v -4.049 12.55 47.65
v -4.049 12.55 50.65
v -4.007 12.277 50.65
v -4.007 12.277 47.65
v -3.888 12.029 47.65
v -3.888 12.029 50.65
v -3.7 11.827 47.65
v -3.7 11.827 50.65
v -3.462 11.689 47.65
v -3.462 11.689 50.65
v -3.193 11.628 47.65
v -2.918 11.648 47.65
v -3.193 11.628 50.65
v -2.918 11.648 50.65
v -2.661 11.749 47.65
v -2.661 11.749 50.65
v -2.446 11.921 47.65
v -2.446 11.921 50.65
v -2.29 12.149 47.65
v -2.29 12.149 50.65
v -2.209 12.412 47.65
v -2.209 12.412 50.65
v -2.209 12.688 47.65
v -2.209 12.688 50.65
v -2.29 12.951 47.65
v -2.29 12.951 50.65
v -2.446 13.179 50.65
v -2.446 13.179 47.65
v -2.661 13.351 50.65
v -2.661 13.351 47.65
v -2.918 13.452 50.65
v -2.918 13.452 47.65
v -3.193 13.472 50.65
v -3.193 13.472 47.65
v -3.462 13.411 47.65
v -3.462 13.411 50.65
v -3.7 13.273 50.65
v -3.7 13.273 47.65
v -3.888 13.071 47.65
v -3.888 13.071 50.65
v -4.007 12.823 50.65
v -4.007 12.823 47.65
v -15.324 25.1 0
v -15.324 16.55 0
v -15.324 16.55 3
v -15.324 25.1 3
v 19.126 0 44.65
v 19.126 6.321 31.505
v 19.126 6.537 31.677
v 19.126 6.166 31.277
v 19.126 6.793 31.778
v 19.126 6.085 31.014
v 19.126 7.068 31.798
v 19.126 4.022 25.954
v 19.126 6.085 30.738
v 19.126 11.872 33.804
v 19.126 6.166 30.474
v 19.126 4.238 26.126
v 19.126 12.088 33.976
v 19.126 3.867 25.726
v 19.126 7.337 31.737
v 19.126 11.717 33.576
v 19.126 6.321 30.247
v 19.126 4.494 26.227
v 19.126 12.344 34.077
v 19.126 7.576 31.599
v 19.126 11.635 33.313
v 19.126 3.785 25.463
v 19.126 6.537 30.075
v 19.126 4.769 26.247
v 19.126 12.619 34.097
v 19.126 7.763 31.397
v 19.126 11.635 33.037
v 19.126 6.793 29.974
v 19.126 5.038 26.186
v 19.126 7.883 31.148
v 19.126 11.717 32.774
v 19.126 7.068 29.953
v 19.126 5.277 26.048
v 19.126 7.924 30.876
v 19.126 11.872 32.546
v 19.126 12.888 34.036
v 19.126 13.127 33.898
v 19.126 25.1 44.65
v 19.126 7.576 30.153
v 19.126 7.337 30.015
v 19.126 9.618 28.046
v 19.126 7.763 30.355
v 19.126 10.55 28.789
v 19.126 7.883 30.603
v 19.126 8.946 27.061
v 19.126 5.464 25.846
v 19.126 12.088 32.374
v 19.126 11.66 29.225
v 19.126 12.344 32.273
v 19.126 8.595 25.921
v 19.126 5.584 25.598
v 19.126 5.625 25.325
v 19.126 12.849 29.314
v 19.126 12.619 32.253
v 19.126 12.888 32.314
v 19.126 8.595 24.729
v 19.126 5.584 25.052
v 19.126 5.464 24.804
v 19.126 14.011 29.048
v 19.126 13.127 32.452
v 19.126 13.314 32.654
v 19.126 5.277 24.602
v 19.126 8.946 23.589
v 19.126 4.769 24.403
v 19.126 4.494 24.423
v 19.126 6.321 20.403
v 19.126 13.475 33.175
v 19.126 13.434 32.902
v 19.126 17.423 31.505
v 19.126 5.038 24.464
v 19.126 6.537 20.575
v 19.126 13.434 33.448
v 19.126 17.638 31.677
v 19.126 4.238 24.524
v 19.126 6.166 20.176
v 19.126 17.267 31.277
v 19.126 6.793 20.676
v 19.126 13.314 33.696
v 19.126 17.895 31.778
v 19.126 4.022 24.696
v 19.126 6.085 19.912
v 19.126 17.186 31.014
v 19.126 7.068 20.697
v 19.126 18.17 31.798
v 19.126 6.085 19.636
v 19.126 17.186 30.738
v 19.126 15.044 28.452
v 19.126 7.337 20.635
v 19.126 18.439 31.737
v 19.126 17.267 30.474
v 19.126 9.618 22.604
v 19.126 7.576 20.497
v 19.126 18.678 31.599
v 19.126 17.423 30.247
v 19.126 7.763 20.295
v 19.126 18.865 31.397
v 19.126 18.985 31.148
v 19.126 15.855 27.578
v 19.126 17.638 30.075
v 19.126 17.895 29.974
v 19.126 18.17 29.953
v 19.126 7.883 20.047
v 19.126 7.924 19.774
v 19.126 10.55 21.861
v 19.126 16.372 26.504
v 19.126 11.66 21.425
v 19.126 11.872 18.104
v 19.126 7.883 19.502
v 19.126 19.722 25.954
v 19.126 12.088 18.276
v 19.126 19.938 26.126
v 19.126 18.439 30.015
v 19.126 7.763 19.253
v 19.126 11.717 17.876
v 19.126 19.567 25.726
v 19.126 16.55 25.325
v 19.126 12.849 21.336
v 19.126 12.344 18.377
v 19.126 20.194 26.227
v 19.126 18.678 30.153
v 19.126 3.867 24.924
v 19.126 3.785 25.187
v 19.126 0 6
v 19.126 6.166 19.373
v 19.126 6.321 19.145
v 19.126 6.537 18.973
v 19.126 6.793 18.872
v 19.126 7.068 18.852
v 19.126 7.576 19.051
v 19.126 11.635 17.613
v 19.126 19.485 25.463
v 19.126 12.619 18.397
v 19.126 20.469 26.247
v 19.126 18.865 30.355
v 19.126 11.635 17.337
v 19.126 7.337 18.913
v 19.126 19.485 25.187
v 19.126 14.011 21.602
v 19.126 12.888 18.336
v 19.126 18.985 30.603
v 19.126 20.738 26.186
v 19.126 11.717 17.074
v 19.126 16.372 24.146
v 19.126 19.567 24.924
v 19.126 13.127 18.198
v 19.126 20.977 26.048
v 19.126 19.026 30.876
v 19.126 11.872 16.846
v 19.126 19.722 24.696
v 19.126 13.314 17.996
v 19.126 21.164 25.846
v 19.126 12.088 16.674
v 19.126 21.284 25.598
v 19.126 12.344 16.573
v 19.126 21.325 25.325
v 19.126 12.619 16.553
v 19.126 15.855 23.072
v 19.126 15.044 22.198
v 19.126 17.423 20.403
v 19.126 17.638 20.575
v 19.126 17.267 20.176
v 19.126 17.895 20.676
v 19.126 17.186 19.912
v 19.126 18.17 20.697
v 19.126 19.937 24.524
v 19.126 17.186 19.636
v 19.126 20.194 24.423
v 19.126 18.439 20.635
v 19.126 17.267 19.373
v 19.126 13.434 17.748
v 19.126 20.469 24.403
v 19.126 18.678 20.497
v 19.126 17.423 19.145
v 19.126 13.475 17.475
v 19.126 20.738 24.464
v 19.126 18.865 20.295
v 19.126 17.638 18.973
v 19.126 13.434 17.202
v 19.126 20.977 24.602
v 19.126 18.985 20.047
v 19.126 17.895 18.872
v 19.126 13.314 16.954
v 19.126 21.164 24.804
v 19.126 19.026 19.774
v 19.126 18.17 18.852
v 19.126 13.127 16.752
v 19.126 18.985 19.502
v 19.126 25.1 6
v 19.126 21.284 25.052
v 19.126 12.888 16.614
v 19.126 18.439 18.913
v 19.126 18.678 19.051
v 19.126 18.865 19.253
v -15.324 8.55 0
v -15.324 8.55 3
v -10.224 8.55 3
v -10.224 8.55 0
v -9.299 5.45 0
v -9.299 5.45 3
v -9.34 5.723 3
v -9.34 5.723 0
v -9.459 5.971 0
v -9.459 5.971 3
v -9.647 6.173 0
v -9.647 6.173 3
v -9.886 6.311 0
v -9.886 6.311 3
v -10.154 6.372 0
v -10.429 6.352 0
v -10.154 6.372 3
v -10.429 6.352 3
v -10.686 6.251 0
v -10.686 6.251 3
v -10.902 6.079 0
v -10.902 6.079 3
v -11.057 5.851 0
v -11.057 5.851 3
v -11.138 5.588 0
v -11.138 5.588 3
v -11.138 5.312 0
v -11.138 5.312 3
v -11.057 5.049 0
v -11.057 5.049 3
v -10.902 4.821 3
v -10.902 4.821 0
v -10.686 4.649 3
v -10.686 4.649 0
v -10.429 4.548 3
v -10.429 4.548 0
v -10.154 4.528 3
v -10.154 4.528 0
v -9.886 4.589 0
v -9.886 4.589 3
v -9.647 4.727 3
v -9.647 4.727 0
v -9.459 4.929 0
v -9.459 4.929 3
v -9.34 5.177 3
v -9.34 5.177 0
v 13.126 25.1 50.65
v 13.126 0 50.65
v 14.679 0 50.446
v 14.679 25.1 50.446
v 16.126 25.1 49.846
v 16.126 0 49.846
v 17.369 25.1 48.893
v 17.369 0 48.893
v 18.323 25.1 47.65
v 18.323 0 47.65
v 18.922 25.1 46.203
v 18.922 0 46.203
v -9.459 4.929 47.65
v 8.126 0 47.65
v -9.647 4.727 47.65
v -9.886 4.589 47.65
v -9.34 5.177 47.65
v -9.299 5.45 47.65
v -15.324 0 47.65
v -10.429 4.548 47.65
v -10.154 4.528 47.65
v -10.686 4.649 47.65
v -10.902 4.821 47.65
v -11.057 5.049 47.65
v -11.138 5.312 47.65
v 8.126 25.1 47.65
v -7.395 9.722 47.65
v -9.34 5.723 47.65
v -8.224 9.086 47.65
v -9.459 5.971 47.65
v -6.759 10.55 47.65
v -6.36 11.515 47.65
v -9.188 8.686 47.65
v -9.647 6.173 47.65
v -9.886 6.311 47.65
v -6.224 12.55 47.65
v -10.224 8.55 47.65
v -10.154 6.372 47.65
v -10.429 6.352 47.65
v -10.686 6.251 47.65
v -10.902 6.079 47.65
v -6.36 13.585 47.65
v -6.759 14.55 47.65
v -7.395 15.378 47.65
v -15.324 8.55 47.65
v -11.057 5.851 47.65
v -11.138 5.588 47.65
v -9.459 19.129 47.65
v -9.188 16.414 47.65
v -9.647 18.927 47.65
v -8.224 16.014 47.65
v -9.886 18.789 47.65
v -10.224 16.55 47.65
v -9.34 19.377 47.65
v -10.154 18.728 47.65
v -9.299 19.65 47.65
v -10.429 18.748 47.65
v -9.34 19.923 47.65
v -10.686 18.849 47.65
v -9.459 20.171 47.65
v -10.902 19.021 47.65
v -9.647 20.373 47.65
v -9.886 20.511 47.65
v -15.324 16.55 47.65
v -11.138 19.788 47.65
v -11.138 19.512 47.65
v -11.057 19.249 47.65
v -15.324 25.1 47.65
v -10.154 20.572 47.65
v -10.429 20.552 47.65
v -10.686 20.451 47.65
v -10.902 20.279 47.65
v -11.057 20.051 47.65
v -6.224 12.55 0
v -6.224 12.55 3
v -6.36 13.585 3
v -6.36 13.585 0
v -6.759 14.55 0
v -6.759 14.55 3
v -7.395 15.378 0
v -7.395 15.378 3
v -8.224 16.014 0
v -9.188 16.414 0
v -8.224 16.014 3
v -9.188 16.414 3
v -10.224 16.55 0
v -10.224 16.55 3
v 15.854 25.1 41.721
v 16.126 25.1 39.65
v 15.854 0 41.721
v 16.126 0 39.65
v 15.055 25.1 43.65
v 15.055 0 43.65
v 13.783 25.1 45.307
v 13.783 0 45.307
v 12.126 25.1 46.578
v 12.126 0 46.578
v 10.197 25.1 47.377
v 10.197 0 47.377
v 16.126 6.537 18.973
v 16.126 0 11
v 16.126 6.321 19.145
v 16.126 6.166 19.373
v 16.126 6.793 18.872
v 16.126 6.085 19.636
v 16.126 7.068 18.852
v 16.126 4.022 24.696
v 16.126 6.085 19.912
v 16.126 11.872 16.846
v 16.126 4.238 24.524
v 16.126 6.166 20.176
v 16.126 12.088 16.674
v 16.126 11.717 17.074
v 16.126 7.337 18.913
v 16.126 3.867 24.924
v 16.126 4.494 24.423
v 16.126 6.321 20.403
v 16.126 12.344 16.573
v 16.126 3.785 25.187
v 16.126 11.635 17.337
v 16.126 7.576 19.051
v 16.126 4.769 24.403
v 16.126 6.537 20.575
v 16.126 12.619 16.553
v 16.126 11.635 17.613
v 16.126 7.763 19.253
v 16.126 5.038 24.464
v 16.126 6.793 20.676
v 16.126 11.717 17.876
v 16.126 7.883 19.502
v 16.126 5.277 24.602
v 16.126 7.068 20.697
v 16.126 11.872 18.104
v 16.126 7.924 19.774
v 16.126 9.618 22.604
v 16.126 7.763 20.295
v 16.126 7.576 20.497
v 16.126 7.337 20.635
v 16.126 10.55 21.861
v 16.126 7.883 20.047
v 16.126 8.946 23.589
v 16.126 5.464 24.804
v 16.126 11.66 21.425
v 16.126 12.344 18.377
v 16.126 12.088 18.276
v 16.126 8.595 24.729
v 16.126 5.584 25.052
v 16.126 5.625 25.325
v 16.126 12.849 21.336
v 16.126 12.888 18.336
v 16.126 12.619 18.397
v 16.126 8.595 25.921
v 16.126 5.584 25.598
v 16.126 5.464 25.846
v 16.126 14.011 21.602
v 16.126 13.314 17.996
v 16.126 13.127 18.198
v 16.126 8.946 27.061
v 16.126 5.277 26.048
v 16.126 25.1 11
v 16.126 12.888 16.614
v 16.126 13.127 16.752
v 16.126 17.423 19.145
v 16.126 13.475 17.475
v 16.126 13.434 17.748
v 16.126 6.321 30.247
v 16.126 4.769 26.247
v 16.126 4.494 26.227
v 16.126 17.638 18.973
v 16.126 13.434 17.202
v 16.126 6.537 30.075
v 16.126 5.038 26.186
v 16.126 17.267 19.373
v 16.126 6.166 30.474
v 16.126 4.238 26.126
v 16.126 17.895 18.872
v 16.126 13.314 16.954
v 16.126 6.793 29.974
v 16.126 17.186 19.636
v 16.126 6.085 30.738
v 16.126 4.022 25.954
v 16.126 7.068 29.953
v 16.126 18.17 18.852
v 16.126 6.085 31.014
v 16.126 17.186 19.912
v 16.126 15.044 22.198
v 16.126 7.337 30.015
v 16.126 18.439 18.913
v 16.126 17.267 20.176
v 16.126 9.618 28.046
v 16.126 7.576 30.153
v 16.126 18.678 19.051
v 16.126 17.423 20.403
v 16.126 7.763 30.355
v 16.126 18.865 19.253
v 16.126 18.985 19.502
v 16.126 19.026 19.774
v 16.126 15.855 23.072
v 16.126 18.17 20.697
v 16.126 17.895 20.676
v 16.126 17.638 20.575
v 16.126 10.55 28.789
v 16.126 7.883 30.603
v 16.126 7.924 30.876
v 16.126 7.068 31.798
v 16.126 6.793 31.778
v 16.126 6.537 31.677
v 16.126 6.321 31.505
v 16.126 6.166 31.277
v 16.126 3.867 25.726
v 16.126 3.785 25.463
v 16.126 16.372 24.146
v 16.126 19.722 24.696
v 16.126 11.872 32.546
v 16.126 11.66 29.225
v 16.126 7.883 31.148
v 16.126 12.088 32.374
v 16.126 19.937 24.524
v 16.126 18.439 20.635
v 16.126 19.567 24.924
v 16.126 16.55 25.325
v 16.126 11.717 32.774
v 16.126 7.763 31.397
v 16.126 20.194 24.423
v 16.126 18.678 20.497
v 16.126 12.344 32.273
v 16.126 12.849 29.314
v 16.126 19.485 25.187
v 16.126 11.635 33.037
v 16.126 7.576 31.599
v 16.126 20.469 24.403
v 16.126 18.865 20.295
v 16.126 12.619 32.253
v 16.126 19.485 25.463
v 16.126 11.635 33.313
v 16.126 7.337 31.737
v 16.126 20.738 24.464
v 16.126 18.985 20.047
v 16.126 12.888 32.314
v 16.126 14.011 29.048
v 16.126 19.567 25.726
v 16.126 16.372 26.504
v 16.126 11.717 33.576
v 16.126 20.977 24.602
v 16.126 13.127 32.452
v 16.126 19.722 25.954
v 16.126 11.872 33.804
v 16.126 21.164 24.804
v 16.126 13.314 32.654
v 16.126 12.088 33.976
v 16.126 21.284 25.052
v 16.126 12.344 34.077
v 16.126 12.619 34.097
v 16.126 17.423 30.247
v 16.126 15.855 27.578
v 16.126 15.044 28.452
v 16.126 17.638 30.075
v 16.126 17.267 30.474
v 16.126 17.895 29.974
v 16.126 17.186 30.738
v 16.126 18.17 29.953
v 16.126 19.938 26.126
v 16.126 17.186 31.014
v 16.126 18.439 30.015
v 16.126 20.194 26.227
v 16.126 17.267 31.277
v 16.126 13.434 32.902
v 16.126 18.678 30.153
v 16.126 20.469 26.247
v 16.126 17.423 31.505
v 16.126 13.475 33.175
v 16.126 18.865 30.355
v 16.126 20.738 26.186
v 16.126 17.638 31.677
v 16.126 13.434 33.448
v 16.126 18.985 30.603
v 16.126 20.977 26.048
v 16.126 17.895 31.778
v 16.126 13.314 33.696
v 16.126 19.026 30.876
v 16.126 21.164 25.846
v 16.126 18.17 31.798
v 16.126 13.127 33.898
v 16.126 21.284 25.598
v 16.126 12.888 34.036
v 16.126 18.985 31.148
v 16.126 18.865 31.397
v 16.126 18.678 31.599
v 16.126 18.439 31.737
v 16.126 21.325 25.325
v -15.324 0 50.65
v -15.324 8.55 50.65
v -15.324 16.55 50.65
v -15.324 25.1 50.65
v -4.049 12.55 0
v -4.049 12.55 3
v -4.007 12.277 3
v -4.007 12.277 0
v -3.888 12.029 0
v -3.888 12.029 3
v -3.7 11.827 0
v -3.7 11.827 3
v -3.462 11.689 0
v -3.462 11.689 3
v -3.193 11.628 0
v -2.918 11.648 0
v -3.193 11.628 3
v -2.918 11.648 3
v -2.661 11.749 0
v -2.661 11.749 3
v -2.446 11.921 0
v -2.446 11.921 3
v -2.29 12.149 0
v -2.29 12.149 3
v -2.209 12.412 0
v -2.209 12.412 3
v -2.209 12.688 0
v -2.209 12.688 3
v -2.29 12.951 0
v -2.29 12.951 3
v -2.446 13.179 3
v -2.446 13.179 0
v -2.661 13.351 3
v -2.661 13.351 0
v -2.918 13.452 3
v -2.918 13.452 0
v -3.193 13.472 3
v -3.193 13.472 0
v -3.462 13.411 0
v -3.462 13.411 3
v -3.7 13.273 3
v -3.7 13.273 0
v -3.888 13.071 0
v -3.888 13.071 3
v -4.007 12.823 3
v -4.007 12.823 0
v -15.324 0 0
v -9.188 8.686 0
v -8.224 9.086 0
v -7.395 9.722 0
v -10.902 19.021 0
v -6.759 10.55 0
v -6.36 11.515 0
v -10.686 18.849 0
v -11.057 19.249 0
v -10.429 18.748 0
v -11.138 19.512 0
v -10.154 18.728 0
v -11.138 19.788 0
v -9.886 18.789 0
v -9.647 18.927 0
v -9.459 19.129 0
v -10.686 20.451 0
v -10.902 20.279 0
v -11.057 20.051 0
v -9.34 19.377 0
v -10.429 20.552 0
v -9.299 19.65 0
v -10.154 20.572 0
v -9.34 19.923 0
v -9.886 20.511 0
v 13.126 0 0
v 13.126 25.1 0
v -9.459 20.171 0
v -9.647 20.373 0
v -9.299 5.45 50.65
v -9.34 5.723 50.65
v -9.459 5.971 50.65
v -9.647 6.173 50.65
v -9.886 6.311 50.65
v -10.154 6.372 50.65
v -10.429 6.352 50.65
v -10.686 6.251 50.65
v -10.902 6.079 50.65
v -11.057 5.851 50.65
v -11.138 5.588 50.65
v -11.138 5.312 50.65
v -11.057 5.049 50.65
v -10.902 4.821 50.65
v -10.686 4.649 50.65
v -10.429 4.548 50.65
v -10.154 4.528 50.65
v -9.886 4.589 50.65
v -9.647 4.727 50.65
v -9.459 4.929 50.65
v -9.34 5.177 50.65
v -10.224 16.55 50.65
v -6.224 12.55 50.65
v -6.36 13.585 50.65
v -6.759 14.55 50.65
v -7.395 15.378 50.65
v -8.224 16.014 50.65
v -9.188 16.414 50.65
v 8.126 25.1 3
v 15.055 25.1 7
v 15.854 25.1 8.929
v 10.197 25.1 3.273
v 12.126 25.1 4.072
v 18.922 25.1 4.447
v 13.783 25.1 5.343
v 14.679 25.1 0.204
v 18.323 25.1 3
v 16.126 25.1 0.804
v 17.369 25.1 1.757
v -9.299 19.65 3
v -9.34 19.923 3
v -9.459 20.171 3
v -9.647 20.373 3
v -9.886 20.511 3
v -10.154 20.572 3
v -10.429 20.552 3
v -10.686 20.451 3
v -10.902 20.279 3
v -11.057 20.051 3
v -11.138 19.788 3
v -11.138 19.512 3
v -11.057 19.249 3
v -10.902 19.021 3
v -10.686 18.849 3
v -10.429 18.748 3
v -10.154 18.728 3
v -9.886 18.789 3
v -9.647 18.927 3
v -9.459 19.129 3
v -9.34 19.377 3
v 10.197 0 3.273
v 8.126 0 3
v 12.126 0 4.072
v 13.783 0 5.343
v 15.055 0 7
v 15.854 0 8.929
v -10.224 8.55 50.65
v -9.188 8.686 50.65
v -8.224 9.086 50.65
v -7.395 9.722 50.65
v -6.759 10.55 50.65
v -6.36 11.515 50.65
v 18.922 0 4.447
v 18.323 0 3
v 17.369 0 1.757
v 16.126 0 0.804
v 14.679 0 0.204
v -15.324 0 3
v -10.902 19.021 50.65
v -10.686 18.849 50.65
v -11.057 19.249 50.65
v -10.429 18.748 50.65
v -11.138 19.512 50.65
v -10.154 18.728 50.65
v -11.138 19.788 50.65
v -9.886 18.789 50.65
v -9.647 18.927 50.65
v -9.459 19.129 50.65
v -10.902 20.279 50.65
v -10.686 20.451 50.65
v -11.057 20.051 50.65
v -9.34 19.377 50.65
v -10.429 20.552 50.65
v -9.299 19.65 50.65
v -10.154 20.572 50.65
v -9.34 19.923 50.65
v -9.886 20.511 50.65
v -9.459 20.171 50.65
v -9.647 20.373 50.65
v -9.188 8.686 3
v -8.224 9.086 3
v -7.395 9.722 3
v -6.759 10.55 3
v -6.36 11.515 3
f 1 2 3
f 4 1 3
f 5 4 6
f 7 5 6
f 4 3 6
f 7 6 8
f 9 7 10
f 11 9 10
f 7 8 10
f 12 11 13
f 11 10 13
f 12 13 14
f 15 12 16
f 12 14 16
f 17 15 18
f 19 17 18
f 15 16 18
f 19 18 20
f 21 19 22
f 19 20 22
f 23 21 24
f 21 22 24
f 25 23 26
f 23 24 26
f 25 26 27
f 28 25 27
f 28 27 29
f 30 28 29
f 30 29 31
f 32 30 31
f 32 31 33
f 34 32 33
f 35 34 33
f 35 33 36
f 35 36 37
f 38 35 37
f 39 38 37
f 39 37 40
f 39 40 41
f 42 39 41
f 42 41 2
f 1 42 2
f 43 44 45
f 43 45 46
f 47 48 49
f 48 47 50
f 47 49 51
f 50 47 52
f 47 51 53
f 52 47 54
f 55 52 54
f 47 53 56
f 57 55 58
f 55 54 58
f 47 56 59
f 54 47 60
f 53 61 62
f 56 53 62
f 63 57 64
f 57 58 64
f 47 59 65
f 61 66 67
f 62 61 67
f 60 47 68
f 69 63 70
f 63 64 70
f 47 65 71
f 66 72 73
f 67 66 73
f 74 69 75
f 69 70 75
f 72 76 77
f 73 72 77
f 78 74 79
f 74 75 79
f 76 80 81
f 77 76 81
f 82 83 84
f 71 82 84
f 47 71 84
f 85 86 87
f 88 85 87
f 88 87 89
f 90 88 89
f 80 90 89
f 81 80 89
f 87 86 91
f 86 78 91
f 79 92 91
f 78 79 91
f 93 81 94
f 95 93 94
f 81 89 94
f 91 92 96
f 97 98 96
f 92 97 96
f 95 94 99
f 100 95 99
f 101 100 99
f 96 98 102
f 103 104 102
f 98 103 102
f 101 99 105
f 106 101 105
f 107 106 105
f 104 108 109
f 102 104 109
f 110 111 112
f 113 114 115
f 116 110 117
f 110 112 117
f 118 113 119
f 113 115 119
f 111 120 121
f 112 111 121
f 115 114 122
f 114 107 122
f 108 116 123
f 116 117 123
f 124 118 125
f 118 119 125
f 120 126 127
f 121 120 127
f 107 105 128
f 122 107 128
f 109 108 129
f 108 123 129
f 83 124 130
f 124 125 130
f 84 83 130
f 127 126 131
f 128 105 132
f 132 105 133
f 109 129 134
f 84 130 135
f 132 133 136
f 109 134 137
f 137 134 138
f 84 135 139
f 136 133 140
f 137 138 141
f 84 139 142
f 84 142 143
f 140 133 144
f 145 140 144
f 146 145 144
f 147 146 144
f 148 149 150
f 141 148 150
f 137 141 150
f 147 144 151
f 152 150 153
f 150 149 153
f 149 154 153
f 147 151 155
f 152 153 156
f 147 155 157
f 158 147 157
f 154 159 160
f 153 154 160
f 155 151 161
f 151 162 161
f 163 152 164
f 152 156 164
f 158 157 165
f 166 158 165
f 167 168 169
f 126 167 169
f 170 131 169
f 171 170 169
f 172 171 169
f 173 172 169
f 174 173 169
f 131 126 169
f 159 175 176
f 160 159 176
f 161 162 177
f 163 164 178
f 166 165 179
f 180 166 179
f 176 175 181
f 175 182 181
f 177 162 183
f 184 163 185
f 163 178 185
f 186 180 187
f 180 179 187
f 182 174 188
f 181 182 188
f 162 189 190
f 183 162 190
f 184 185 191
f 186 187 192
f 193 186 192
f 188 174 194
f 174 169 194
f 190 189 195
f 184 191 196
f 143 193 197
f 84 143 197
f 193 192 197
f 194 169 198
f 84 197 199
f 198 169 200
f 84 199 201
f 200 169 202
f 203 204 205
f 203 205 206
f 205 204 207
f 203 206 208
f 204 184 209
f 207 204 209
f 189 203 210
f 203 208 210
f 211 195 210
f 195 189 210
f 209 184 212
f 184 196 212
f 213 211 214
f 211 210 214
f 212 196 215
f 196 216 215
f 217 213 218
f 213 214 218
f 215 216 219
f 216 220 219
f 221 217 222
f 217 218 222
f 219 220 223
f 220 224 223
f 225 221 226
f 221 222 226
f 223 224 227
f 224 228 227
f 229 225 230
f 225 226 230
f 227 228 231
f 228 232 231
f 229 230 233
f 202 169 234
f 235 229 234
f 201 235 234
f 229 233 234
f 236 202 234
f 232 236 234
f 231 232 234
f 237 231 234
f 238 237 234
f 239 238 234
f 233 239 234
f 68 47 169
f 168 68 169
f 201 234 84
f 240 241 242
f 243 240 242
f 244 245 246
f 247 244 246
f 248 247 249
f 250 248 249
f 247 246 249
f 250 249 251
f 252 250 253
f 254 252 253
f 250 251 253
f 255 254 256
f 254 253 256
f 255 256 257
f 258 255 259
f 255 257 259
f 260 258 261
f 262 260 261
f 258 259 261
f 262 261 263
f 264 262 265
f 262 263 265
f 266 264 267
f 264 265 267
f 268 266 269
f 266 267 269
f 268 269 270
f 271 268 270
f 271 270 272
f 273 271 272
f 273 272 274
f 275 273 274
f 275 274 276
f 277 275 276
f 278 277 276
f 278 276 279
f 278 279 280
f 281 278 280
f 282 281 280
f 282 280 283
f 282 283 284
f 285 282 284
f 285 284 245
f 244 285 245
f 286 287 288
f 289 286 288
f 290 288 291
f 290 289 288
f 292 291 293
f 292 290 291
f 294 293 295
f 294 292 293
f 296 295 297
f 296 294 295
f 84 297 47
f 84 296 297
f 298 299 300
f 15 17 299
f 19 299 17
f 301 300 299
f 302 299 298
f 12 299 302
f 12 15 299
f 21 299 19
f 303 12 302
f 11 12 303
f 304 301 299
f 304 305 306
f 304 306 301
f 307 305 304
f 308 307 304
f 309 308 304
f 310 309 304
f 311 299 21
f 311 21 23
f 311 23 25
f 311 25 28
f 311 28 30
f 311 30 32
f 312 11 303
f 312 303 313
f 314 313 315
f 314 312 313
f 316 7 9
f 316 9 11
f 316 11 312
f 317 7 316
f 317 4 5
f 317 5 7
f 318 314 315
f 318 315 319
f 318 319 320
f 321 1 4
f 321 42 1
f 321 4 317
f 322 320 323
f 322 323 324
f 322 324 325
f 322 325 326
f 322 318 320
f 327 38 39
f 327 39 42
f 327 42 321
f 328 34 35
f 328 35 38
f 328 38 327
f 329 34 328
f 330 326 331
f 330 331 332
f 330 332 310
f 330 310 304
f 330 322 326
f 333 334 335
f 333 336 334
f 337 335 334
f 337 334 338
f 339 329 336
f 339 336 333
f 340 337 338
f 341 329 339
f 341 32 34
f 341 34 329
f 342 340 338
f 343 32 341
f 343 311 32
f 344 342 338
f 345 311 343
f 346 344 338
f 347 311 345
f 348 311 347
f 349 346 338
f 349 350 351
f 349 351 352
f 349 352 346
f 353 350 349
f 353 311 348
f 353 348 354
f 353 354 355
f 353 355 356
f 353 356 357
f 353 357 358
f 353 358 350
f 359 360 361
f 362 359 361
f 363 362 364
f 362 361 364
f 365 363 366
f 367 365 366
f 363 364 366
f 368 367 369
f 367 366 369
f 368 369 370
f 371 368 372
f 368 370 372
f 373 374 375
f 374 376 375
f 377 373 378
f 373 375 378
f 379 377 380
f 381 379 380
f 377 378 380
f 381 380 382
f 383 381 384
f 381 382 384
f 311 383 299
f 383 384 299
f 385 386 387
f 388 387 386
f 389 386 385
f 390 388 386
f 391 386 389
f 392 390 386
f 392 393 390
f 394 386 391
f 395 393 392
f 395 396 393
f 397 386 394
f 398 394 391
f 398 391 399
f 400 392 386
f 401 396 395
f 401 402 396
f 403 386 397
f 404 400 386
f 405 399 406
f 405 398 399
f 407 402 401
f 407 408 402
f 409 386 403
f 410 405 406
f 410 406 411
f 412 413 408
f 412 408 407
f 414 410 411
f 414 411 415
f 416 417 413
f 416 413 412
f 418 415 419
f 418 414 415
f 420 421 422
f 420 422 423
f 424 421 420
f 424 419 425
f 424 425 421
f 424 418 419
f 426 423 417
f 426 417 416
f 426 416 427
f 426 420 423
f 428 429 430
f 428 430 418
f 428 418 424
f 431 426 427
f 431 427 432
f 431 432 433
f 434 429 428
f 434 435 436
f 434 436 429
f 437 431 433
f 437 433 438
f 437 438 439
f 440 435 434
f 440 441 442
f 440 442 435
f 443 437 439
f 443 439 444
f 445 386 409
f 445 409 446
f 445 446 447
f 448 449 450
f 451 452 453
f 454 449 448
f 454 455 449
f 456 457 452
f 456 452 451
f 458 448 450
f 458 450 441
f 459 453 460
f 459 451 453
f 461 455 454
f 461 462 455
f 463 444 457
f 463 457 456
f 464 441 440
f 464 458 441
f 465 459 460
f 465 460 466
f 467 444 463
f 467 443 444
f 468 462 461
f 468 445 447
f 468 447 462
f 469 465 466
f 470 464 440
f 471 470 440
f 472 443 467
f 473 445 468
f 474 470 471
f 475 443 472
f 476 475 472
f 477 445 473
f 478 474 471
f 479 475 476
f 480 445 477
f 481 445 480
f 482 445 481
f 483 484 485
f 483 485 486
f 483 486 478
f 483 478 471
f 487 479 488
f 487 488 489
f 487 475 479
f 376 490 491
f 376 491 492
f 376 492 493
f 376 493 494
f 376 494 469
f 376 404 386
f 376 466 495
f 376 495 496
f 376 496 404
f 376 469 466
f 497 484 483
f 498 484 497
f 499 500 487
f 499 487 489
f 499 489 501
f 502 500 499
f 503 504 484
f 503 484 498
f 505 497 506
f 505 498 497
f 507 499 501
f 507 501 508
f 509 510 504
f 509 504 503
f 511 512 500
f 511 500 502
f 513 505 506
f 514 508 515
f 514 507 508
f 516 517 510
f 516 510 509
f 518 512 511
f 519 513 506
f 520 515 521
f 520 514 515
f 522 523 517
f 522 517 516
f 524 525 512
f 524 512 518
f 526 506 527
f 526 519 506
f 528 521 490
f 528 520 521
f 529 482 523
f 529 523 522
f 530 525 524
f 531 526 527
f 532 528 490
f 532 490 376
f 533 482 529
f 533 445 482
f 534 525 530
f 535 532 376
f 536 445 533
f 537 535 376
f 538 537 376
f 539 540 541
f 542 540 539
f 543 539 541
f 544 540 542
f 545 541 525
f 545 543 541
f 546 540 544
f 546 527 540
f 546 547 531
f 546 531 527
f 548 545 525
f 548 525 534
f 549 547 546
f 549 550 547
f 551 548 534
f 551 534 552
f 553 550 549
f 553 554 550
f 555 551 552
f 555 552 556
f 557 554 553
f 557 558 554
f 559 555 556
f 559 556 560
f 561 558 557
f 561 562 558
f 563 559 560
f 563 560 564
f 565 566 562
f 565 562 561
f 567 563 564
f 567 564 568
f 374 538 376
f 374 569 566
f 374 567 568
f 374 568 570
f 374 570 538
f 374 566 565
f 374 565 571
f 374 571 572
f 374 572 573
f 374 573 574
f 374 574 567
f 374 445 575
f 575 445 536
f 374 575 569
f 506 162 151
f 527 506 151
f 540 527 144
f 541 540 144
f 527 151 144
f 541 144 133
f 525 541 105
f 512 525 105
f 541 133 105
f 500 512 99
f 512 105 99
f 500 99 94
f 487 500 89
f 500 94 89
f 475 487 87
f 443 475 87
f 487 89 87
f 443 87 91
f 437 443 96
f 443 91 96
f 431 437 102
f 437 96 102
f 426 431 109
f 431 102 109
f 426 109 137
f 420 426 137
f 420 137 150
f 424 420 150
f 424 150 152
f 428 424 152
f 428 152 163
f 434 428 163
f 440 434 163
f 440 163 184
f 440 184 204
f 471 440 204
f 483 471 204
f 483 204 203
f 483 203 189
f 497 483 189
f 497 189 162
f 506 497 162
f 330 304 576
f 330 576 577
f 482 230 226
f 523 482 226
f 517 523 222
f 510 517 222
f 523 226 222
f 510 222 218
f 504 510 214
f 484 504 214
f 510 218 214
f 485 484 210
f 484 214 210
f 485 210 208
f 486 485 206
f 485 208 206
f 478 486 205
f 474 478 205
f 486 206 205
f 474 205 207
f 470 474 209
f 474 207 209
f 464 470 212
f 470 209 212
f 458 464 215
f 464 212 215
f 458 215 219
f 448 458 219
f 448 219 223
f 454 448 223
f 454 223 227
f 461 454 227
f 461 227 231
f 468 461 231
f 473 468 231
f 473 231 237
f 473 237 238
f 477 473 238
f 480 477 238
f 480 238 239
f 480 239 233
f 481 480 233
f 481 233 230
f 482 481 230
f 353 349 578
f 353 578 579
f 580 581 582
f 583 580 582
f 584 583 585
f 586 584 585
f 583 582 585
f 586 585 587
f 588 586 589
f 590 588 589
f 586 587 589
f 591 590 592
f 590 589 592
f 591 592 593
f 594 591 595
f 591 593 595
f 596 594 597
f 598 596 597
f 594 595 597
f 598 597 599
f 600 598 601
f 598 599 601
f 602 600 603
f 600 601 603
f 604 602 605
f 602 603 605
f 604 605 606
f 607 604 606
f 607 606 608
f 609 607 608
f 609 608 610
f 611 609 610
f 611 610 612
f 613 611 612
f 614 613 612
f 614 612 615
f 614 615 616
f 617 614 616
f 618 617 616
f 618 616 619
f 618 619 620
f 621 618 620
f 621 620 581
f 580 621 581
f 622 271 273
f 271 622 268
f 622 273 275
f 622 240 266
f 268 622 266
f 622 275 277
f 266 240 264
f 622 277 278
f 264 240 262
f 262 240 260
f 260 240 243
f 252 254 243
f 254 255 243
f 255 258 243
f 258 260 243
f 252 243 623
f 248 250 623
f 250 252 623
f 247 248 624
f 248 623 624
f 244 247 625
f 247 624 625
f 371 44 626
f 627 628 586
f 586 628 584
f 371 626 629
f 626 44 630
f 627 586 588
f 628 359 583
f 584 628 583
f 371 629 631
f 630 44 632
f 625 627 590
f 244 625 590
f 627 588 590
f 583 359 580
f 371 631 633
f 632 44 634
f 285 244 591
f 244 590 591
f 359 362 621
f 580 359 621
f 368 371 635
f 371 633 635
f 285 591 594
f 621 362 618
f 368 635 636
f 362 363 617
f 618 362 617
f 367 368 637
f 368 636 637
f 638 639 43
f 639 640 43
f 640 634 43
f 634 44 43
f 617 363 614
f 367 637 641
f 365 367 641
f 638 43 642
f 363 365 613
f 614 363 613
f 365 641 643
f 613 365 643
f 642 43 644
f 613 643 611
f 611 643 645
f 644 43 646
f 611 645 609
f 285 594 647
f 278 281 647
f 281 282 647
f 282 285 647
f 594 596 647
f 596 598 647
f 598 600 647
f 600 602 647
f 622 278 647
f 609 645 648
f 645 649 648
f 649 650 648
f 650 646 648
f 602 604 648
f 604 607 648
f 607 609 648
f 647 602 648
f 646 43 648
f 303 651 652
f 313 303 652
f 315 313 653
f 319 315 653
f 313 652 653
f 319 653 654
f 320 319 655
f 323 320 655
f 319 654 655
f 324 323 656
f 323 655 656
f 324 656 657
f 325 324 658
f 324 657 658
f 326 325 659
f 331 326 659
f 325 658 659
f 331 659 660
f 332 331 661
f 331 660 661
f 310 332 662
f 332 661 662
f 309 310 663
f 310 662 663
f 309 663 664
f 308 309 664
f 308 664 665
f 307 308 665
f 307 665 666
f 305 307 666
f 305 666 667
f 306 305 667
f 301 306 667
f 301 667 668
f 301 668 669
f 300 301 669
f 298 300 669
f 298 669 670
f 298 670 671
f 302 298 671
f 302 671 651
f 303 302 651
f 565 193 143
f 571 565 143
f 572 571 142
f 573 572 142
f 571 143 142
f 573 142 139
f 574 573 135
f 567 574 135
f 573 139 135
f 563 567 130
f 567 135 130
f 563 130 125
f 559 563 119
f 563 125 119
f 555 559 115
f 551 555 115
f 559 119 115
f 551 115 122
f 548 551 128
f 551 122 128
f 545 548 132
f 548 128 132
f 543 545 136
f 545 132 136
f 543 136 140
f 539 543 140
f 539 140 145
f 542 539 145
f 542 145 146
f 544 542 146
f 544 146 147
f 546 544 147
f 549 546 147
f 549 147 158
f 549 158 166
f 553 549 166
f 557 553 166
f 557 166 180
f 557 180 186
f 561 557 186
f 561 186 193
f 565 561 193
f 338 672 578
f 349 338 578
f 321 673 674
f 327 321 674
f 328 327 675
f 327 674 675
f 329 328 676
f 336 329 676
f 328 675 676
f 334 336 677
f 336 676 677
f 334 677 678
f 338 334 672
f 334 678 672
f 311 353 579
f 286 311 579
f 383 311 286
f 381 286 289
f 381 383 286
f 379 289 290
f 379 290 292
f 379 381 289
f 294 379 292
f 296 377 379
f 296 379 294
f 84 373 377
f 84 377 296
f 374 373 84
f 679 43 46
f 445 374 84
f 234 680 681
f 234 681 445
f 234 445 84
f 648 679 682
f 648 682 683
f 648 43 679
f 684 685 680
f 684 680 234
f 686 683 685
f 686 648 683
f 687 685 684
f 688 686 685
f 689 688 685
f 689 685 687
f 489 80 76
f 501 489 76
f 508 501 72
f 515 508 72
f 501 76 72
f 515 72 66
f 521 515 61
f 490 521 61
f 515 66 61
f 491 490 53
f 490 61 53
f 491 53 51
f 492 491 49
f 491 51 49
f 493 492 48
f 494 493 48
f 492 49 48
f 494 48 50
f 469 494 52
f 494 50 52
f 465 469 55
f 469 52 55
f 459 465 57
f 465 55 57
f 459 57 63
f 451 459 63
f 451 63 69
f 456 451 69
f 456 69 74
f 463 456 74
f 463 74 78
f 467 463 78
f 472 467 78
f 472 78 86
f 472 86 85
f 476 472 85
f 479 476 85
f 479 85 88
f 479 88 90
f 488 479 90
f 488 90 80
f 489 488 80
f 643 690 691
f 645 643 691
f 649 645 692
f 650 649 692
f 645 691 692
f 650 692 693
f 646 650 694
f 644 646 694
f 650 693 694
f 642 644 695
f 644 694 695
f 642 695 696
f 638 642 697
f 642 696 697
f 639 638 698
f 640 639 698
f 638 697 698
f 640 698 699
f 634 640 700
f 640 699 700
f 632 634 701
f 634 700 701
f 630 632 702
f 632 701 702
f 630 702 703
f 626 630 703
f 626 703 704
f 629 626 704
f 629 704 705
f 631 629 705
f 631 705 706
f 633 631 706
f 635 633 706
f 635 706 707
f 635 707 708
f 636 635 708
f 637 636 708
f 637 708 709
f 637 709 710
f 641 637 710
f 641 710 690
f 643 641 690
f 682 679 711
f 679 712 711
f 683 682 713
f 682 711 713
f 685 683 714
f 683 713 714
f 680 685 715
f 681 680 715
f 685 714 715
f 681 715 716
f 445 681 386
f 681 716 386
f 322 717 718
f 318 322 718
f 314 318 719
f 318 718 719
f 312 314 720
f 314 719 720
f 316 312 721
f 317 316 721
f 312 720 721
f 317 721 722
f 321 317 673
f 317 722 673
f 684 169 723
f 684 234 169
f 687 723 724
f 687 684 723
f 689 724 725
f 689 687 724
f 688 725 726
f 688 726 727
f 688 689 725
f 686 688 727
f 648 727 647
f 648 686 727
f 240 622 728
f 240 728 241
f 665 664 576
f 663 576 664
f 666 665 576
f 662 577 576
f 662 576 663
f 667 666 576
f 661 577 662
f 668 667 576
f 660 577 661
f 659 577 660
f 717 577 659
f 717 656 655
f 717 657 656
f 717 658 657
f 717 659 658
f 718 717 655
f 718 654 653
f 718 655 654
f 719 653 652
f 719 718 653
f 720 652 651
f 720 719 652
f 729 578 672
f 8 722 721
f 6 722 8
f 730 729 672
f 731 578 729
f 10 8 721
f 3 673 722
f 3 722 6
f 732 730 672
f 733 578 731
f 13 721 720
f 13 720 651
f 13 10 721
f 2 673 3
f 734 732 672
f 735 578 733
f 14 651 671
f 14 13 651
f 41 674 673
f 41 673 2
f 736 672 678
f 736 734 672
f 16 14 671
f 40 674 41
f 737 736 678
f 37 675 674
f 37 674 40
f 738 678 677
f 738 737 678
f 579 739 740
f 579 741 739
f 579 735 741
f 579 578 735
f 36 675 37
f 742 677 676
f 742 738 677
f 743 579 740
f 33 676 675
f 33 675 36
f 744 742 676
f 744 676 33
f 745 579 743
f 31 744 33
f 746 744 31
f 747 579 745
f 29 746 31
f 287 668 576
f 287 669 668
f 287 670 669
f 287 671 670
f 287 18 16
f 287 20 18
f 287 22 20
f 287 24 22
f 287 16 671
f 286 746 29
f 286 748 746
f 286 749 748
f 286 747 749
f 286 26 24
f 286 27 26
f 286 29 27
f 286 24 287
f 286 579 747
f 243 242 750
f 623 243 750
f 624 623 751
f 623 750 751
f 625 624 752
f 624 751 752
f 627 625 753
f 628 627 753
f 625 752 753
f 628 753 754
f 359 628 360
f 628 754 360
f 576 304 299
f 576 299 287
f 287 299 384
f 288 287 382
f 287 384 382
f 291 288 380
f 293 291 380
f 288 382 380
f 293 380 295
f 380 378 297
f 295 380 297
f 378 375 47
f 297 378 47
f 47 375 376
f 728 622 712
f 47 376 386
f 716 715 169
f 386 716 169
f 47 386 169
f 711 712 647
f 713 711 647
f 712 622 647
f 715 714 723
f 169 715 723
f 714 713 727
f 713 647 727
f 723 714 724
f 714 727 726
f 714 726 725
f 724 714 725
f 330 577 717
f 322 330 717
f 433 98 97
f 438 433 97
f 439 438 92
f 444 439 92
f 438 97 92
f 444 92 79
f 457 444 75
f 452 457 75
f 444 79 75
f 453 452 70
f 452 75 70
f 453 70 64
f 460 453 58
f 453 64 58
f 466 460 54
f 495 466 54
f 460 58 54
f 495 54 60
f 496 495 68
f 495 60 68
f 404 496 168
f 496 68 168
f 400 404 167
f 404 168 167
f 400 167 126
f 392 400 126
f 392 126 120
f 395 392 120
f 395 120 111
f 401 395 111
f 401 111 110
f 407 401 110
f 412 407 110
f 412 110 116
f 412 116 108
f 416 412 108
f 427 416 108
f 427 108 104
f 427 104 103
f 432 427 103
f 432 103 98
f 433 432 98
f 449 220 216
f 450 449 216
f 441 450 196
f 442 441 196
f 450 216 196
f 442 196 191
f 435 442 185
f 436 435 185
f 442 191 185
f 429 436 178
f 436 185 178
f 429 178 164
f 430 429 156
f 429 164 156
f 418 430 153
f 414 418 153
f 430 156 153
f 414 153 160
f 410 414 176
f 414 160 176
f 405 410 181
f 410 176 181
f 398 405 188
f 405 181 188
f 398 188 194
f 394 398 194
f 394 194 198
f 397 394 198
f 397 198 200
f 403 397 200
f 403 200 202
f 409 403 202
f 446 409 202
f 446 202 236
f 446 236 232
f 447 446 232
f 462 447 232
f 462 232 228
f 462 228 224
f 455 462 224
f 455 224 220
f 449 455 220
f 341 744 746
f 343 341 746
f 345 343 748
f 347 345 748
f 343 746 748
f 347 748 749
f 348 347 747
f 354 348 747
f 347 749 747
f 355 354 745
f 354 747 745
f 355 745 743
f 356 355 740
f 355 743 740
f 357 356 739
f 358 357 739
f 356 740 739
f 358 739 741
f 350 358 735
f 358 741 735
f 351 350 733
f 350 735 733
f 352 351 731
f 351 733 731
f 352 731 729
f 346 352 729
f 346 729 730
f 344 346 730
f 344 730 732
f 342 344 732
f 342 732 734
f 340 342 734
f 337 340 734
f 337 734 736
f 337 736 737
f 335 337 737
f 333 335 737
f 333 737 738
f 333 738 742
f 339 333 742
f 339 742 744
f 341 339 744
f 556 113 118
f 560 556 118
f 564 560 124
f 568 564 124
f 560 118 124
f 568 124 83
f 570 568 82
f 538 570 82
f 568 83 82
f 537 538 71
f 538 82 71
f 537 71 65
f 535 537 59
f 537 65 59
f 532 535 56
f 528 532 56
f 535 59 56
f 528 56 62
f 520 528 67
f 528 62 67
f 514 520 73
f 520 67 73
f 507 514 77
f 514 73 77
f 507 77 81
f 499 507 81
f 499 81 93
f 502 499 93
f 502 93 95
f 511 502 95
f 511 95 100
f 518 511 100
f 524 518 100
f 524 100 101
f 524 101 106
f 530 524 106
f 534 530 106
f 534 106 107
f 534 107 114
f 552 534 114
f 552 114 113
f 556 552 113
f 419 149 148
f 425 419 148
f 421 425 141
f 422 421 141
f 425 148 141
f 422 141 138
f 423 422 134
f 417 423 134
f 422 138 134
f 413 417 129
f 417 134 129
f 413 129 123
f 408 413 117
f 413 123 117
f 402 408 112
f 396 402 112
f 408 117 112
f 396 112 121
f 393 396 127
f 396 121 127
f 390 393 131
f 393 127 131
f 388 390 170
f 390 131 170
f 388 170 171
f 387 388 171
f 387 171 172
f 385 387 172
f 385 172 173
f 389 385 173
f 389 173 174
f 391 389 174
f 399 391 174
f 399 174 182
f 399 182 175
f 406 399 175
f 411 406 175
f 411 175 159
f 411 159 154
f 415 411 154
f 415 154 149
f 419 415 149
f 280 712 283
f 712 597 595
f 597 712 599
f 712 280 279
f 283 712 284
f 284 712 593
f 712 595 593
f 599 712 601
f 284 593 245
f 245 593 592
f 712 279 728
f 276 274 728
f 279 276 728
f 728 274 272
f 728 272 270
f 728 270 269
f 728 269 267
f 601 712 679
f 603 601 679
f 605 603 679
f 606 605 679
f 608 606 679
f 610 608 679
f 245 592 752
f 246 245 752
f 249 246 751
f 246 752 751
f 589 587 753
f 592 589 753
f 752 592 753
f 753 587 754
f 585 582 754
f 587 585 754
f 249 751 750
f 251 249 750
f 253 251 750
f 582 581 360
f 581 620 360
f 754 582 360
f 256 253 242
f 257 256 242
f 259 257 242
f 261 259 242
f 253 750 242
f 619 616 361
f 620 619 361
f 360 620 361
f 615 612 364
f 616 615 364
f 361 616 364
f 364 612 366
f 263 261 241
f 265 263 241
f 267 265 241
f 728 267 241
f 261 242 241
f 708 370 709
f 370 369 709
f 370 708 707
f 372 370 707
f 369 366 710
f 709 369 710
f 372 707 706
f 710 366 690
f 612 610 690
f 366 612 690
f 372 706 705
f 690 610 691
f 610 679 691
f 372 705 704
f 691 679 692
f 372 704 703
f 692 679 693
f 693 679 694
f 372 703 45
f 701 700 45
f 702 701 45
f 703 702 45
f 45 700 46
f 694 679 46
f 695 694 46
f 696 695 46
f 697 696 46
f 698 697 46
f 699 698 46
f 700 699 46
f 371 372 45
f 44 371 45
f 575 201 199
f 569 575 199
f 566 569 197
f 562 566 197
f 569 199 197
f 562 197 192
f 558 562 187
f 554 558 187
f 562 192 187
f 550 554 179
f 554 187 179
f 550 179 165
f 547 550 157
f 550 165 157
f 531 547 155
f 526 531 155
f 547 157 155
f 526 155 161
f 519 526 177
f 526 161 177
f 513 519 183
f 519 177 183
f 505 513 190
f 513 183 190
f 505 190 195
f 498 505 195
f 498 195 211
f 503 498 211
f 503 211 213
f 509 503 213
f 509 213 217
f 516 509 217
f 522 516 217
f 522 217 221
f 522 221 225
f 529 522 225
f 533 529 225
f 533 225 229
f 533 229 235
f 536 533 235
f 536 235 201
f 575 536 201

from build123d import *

# Parameters (mm, degrees)
F0_W      = 34.45
F0_H      = 25.1
F1_DEPTH  = 50.65
F2_T      = -3
F3_R      = 4
F3_R_2    = 0.925
F4_DEPTH  = 25
F5_W      = 31.45
F5_H      = 44.65
F6_DEPTH  = 25.101
F7_R      = 8
F8_R      = 6
F9_R      = 0.925
F10_DEPTH = 50.651


with BuildPart() as f1:
    # F0 (on Top) → F1 (new body)
    with BuildSketch(Plane.XY):
        with Locations((1.9014209259, 12.55)):
            Rectangle(F0_W, F0_H)
    extrude(amount=F1_DEPTH)

    # F2
    f2_openings = [f1.faces().sort_by_distance(p)[0] for p in [
        (-15.323579, 12.55, 25.325),
    ]]
    offset(amount=F2_T, openings=f2_openings)

    # F3 (on face) → F4 (cut)
    with BuildSketch(Plane.YZ.offset(19.1264209259)):
        with Locations((12.55, 25.325)):
            Circle(F3_R)
        with Locations((12.55, 17.475)):
            Circle(F3_R_2)
        with Locations((18.1007882323, 19.7742117677)):
            Circle(F3_R_2)
        with Locations((20.4, 25.325)):
            Circle(F3_R_2)
        with Locations((18.1007882323, 30.8757882323)):
            Circle(F3_R_2)
        with Locations((12.55, 33.175)):
            Circle(F3_R_2)
        with Locations((6.9992117677, 30.8757882323)):
            Circle(F3_R_2)
        with Locations((4.7, 25.325)):
            Circle(F3_R_2)
        with Locations((6.9992117677, 19.7742117677)):
            Circle(F3_R_2)
    extrude(amount=-F4_DEPTH, mode=Mode.SUBTRACT)

    # F5 (on face) → F6 (cut, through all)
    with BuildSketch(Plane(origin=(0, 25.1, 0), x_dir=(-1, 0, 0), z_dir=(0, 1, 0))):
        with Locations((-0.4014209259, 25.325)):
            Rectangle(F5_W, F5_H)
    extrude(amount=-F6_DEPTH, mode=Mode.SUBTRACT)

    # F7
    f7_edges = [f1.edges().sort_by_distance(p)[0] for p in [
        (16.126421, 12.55, 47.65),
        (16.126421, 12.55, 3),
    ]]
    fillet(f7_edges, radius=F7_R)

    # F8
    f8_edges = [f1.edges().sort_by_distance(p)[0] for p in [
        (19.126421, 12.55, 50.65),
        (19.126421, 12.55, 0),
    ]]
    fillet(f8_edges, radius=F8_R)

    # F9 (on face) → F10 (cut, through all)
    with BuildSketch(Plane.XY.offset(50.65)):
        with Locations((-10.2235790741, 19.65)):
            Circle(F9_R)
        with Locations((-10.2235790741, 5.45)):
            Circle(F9_R)
        with BuildLine():
            Line((-4.0485790741, 12.55), (-2.1985790741, 12.55))
            ThreePointArc((-2.1985790741, 12.55), (-3.1235790741, 13.475), (-4.0485790741, 12.55))
        make_face()
        with BuildLine():
            ThreePointArc((-4.0485790741, 12.55), (-3.1235790741, 11.625), (-2.1985790741, 12.55))
            Line((-2.1985790741, 12.55), (-4.0485790741, 12.55))
        make_face()
        with BuildLine():
            ThreePointArc((-10.2235790741, 16.55), (-13.0520061988, 15.3784271247), (-14.2235790741, 12.55))
            Line((-14.2235790741, 12.55), (-6.2235790741, 12.55))
            ThreePointArc((-6.2235790741, 12.55), (-7.3951519493, 15.3784271247), (-10.2235790741, 16.55))
        make_face()
        with BuildLine():
            ThreePointArc((-14.2235790741, 12.55), (-13.0520061988, 9.7215728753), (-10.2235790741, 8.55))
            ThreePointArc((-10.2235790741, 8.55), (-7.3951519493, 9.7215728753), (-6.2235790741, 12.55))
            Line((-6.2235790741, 12.55), (-14.2235790741, 12.55))
        make_face()
        with BuildLine():
            Line((-15.3235790741, 16.55), (-15.3235790741, 12.55))
            Line((-15.3235790741, 12.55), (-14.2235790741, 12.55))
            ThreePointArc((-14.2235790741, 12.55), (-13.0520061988, 15.3784271247), (-10.2235790741, 16.55))
            Line((-10.2235790741, 16.55), (-15.3235790741, 16.55))
        make_face()
        with BuildLine():
            Line((-15.3235790741, 12.55), (-15.3235790741, 8.55))
            Line((-15.3235790741, 8.55), (-10.2235790741, 8.55))
            ThreePointArc((-10.2235790741, 8.55), (-13.0520061988, 9.7215728753), (-14.2235790741, 12.55))
            Line((-14.2235790741, 12.55), (-15.3235790741, 12.55))
        make_face()
    extrude(amount=-F10_DEPTH, mode=Mode.SUBTRACT)


solid = f1.part
